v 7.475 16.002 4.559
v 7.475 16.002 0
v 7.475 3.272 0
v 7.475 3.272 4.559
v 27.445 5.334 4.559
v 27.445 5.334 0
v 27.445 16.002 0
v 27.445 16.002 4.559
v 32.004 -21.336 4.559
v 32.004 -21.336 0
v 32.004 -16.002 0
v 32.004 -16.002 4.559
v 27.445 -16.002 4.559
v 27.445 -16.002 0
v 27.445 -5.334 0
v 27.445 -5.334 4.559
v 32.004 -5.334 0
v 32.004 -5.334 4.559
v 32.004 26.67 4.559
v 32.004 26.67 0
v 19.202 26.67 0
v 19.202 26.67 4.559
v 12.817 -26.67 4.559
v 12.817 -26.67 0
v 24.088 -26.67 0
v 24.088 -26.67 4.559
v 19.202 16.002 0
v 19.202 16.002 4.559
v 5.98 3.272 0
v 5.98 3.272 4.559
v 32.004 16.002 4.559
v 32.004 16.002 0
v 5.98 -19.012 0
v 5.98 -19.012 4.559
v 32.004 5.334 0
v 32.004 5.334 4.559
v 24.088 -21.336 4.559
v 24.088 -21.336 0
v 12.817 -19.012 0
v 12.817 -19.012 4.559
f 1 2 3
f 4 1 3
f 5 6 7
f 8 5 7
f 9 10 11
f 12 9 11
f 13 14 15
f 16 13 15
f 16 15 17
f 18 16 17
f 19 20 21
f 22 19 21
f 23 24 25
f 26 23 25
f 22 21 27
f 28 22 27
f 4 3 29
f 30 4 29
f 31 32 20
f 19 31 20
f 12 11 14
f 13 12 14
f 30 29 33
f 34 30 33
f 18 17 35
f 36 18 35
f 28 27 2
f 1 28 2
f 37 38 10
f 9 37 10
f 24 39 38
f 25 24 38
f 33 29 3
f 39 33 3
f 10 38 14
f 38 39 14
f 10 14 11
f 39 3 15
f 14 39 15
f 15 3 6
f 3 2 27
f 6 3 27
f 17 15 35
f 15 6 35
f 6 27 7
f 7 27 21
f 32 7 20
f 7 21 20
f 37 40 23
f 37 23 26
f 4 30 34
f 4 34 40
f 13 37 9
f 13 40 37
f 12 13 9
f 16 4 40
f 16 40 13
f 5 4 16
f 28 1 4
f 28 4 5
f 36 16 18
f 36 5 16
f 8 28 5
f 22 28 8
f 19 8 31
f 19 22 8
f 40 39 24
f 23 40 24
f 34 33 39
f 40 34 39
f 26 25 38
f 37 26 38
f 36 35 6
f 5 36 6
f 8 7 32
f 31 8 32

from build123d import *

# Parameters (mm, degrees)
BOSS_EXTRUDE1_DEPTH = 4.5593


with BuildPart() as part:
    # Sketch1 → Boss-Extrude1 (new body)
    with BuildSketch(Plane.XY):
        Polygon((24.0884075, -21.336), (32.004, -21.336), (32.004, -16.002), (27.4447, -16.002), (27.4447, -5.334), (32.004, -5.334), (32.004, 5.334), (27.4447, 5.334), (27.4447, 16.002), (32.004, 16.002), (32.004, 26.67), (19.2024, 26.67), (19.2024, 21.336), (19.2024, 16.002), (7.47522, 16.002), (7.47522, 12.9921), (7.47522, 3.27152), (5.980176, 3.27152), (5.980176, -19.0119), (8.2572225, -19.0119), (12.8165225, -19.0119), (12.8165225, -26.67), (24.0884075, -26.67), align=None)
    extrude(amount=BOSS_EXTRUDE1_DEPTH)


solid = part.part
